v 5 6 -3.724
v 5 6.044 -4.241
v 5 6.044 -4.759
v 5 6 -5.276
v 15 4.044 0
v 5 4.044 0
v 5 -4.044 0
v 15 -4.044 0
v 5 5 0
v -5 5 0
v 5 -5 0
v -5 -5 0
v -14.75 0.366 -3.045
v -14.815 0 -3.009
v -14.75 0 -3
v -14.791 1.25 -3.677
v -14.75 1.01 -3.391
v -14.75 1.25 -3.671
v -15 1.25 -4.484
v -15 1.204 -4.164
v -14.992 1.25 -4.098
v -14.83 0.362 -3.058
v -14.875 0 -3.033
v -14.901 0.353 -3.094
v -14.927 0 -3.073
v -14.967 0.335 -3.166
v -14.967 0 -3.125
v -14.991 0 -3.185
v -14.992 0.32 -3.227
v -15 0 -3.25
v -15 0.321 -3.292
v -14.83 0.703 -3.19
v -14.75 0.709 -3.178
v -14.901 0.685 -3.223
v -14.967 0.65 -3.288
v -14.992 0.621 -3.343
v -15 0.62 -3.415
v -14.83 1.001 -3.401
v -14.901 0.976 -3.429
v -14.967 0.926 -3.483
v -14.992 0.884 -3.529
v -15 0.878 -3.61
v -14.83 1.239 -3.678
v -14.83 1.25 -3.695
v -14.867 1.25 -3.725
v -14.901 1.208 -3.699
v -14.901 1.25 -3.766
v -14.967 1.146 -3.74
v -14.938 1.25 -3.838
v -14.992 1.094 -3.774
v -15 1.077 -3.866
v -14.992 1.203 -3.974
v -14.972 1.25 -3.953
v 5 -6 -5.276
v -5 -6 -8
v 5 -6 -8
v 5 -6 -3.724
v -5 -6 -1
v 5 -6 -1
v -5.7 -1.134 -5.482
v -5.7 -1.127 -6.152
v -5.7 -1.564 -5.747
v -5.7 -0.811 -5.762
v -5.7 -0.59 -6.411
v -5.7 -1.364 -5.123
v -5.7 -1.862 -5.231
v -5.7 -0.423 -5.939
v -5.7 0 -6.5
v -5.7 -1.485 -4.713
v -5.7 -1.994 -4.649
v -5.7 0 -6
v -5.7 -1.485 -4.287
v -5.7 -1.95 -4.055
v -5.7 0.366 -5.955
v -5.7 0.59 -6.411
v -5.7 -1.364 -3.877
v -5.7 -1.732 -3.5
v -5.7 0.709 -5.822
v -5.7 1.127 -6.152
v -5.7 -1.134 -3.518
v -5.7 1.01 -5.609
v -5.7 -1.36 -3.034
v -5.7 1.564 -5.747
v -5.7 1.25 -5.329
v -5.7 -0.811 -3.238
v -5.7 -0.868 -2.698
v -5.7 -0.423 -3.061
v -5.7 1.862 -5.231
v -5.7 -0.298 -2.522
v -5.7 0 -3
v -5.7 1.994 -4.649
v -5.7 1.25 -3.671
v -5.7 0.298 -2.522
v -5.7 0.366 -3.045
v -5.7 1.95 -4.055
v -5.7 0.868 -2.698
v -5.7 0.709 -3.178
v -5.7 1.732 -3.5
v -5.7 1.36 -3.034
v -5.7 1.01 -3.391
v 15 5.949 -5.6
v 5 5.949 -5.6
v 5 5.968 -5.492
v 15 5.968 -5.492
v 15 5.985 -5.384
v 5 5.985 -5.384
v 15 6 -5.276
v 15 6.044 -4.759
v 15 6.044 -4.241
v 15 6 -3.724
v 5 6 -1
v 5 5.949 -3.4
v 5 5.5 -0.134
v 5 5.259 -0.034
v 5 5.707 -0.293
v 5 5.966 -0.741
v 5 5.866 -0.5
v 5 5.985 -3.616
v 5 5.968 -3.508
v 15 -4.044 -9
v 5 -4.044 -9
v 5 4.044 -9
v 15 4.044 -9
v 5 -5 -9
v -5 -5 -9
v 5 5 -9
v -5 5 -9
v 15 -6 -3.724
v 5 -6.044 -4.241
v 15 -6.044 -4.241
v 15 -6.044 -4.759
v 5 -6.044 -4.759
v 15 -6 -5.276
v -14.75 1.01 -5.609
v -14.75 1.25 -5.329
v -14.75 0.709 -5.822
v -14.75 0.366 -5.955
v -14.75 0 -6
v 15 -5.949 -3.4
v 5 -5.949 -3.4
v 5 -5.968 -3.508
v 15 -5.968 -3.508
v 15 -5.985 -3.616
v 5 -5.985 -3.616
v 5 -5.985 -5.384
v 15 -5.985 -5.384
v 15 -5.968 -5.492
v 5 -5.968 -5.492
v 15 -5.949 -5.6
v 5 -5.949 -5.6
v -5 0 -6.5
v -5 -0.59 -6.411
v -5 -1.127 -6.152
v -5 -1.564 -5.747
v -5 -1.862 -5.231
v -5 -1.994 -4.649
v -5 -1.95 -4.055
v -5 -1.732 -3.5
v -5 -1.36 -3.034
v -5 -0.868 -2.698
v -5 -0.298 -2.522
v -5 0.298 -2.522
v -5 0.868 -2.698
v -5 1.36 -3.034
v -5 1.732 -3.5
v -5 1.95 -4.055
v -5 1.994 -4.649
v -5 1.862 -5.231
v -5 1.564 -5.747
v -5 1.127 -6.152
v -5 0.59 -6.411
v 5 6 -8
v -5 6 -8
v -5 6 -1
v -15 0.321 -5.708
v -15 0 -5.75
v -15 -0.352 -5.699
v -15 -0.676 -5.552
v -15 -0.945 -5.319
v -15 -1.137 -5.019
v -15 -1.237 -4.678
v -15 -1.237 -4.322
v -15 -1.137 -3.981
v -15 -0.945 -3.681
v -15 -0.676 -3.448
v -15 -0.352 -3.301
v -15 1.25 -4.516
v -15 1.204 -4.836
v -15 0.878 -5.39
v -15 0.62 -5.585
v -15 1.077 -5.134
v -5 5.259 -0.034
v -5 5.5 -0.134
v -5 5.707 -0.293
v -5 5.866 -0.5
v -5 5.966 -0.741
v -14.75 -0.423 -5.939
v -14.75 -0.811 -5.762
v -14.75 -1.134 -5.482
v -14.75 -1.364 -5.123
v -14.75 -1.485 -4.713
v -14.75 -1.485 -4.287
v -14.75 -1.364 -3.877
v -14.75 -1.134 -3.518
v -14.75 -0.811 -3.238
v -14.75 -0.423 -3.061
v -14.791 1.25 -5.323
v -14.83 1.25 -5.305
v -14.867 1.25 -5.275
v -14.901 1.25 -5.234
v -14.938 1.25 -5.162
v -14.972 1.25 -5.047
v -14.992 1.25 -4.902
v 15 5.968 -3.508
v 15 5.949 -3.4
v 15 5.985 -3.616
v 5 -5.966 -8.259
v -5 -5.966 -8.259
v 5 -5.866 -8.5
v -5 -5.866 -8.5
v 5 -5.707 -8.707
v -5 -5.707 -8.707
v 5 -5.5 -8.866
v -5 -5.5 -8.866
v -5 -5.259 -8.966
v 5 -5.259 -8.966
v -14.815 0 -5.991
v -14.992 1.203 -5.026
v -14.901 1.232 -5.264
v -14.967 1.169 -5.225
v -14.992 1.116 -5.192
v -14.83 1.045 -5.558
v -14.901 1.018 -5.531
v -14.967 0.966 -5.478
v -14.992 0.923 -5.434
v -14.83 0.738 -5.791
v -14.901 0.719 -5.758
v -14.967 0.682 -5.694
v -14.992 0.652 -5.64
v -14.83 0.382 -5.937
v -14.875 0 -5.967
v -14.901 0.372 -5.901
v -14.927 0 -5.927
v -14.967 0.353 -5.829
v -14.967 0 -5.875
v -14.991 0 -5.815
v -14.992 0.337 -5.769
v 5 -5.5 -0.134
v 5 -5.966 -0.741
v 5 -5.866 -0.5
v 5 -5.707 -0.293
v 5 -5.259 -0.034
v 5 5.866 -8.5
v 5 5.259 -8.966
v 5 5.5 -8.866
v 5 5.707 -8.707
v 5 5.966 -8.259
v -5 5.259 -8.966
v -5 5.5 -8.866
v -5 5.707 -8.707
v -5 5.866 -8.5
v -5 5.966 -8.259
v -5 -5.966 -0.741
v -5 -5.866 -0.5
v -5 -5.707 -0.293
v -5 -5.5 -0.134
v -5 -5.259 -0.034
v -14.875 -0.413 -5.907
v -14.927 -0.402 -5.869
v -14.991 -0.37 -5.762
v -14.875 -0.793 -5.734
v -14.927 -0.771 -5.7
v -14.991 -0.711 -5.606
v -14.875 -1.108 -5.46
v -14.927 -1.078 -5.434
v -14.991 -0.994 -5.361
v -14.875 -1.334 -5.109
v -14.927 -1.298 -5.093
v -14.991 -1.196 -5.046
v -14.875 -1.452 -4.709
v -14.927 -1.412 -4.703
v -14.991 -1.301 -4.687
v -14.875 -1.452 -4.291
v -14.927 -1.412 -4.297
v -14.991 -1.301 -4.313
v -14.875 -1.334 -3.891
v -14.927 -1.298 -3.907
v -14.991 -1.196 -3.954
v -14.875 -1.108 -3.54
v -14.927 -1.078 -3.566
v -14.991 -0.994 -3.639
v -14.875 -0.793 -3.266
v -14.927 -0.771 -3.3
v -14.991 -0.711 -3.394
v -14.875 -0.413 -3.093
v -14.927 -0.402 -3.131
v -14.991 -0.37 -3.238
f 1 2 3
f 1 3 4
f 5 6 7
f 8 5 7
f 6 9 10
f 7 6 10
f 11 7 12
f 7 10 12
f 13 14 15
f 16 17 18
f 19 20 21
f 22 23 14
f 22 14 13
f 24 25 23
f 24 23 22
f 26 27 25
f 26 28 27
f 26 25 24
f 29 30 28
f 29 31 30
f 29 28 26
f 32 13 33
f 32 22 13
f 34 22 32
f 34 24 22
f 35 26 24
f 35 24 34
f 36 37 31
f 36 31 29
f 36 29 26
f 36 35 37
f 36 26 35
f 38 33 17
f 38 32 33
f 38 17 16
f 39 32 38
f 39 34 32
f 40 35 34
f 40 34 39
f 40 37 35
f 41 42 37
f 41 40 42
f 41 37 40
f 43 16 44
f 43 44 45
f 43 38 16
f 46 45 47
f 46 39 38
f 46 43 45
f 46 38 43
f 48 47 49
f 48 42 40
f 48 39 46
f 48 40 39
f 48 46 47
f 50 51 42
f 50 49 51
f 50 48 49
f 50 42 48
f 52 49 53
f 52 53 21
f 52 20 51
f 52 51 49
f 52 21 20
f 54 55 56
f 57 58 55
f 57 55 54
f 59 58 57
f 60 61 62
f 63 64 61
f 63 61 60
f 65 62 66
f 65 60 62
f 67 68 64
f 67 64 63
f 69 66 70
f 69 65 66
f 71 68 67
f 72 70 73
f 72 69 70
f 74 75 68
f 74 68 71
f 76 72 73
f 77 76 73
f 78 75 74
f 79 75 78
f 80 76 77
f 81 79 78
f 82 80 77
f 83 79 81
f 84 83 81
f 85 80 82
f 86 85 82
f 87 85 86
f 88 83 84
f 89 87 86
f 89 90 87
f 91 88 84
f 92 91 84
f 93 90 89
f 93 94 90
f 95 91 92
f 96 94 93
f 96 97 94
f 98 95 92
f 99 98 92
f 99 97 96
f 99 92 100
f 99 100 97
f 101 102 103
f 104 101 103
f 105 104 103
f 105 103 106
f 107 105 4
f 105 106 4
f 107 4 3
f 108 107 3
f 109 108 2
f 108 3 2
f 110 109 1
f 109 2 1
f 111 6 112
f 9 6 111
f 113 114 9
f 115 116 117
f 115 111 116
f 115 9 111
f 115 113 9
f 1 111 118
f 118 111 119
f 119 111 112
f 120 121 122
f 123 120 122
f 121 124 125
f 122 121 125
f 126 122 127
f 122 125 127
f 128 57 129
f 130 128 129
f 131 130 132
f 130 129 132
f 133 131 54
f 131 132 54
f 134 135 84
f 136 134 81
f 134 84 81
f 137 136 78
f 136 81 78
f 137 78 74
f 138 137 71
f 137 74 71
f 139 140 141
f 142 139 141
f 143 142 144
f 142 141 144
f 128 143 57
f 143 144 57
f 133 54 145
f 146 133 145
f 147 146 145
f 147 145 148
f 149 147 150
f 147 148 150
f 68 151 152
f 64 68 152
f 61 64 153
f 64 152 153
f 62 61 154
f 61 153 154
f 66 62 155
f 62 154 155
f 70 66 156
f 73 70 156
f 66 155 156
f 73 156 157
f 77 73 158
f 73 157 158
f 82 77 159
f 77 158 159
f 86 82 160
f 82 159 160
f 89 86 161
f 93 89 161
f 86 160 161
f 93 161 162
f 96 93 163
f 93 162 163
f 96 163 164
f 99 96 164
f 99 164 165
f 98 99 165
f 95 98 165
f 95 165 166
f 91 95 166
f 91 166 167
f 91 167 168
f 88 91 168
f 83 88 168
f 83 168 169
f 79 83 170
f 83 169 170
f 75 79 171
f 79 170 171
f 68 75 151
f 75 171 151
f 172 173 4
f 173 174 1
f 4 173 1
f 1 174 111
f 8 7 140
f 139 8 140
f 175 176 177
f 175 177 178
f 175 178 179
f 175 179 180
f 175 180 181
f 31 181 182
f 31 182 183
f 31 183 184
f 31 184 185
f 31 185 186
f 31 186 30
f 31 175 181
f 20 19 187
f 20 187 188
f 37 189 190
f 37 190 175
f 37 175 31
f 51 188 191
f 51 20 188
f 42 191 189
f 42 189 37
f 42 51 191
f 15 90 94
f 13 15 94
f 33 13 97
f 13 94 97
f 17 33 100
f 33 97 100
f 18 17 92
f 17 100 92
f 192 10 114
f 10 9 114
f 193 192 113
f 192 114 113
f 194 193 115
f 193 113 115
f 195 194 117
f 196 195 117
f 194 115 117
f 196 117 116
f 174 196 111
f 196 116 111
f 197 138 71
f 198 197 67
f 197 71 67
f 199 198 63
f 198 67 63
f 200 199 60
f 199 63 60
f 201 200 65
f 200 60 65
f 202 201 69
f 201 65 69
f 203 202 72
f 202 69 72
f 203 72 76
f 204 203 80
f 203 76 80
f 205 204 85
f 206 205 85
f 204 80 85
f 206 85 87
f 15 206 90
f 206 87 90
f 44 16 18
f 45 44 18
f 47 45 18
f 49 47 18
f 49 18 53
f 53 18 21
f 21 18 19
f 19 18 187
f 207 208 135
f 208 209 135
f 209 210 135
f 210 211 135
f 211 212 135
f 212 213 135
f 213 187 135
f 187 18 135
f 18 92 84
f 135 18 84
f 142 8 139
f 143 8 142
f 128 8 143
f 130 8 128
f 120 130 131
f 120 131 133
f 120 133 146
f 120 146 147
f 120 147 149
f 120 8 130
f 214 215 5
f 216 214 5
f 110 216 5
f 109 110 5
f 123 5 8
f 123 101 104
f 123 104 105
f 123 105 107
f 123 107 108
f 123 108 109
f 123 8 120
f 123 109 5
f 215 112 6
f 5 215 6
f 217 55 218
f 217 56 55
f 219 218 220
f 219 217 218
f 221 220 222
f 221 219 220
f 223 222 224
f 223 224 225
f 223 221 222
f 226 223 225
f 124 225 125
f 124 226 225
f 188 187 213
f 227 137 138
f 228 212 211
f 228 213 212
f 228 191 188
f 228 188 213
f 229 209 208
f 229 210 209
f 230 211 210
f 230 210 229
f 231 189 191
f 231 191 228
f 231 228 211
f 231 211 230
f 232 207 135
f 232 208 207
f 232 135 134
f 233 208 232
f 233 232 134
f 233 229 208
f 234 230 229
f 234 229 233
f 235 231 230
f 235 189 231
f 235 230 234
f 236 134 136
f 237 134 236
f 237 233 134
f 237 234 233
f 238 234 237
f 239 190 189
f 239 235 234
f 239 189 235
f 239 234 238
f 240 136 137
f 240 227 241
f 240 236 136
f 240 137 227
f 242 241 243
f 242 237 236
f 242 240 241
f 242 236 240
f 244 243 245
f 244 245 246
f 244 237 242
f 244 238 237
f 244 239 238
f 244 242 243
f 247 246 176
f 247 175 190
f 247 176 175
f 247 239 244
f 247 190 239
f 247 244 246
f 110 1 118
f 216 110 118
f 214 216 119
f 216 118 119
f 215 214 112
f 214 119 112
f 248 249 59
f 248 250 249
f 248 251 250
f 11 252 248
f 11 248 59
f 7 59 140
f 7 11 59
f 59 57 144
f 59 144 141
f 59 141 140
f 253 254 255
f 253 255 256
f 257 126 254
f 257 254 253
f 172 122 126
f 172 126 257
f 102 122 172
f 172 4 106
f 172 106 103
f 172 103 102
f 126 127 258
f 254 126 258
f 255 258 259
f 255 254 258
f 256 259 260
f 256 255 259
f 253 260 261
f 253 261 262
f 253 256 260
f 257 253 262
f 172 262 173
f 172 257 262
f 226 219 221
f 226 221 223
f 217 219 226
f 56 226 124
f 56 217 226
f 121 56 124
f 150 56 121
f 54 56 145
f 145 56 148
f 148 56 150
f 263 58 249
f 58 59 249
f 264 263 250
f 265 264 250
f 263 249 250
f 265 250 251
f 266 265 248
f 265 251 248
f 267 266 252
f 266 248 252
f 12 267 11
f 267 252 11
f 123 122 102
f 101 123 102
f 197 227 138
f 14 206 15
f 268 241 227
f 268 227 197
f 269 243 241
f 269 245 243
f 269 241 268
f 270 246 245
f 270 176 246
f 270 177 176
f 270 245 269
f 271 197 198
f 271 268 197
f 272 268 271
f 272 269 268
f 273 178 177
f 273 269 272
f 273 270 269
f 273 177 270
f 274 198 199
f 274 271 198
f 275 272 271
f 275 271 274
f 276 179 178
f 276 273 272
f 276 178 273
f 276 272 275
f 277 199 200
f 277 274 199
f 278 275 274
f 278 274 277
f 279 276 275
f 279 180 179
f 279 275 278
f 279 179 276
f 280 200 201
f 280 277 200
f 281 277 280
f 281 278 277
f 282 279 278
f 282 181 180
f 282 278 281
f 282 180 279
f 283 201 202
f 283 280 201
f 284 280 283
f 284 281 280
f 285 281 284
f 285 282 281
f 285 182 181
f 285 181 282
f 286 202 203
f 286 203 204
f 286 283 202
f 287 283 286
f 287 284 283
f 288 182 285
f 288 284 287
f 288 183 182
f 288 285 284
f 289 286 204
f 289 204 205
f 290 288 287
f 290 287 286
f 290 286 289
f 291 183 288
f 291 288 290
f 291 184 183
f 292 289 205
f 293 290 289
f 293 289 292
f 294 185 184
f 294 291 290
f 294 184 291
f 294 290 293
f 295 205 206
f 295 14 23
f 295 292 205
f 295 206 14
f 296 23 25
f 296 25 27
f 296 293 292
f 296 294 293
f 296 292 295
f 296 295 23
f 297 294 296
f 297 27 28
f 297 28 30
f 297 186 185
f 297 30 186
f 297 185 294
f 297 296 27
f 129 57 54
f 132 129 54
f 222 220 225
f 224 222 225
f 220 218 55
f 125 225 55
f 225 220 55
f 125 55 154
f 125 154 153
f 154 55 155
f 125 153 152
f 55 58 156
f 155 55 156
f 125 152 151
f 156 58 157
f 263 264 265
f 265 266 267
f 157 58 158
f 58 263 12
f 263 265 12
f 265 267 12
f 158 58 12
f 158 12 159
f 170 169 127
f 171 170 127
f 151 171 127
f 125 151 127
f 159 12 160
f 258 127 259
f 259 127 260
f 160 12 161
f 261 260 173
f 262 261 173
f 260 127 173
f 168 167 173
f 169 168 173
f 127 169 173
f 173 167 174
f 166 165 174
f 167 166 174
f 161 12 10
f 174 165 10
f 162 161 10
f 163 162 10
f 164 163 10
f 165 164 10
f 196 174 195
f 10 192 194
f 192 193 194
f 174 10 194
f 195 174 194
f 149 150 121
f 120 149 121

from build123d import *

# Parameters (mm, degrees)
SKETCH1_W           = 10
SKETCH1_H           = 12
SKETCH1_R           = 0.7
BOSS_EXTRUDE1_DEPTH = 9
BOSS_EXTRUDE2_DEPTH = 10
BOSS_EXTRUDE4_DEPTH = 0.7
BOSS_EXTRUDE5_DEPTH = 10
FILLET1_R           = 1
FILLET2_R           = 0.25


with BuildPart() as part:
    # Sketch1 → Boss-Extrude1 (new body)
    # profile 1 of 3: a face of its own
    with BuildSketch(Plane.XY):
        Rectangle(SKETCH1_W, SKETCH1_H)
        with Locations((0, 4.5)):
            Circle(SKETCH1_R, mode=Mode.SUBTRACT)
        with Locations((0, -4.5)):
            Circle(SKETCH1_R, mode=Mode.SUBTRACT)
    # profile 2 of 3: a face of its own
    with BuildSketch(Plane.XY):
        with Locations((0, -4.5)):
            Circle(SKETCH1_R)
    # profile 3 of 3: a face of its own
    with BuildSketch(Plane.XY):
        with Locations((0, 4.5)):
            Circle(SKETCH1_R)
    extrude(amount=-BOSS_EXTRUDE1_DEPTH)

    # Sketch2 → Boss-Extrude2 (add)
    with BuildSketch(Plane(origin=(5, 0, 0), x_dir=(0, 0, -1), z_dir=(1, 0, 0))):
        with BuildLine():
            Line((3.4, 5.949159605), (0, 4.043822449))
            Line((0, 4.043822449), (0, -4.043822449))
            Line((0, -4.043822449), (3.4, -5.949159605))
            ThreePointArc((3.4, -5.949159605), (3.561551285, -5.976772876), (3.723791265, -6))
            Line((3.723791265, -6), (5.276208735, -6))
            ThreePointArc((5.276208735, -6), (5.438448715, -5.976772876), (5.6, -5.949159605))
            Line((5.6, -5.949159605), (9, -4.043822449))
            Line((9, -4.043822449), (9, 4.043822449))
            Line((9, 4.043822449), (5.6, 5.949159605))
            ThreePointArc((5.6, 5.949159605), (5.438448715, 5.976772876), (5.276208735, 6))
            Line((5.276208735, 6), (3.723791265, 6))
            ThreePointArc((3.723791265, 6), (3.561551285, 5.976772876), (3.4, 5.949159605))
        make_face()
        with BuildLine():
            ThreePointArc((5.276208735, 6), (4.5, 6.05), (3.723791265, 6))
            Line((3.723791265, 6), (5.276208735, 6))
        make_face()
        with BuildLine():
            Line((5.276208735, -6), (3.723791265, -6))
            ThreePointArc((3.723791265, -6), (4.5, -6.05), (5.276208735, -6))
        make_face()
    extrude(amount=BOSS_EXTRUDE2_DEPTH)

    # Sketch4 → Boss-Extrude4 (add)
    with BuildSketch(Plane.ZY.offset(5)):
        with BuildLine():
            ThreePointArc((-6.5, 0), (-4.5, -2), (-2.5, 0))
            Line((-2.5, 0), (-3, 0))
            ThreePointArc((-3, 0), (-4.5, -1.5), (-6, 0))
            Line((-6, 0), (-6.5, 0))
        make_face()
        with BuildLine():
            Line((-3, 0), (-2.5, 0))
            ThreePointArc((-2.5, 0), (-4.5, 2), (-6.5, 0))
            Line((-6.5, 0), (-6, 0))
            ThreePointArc((-6, 0), (-5.821691018, 0.709318583), (-5.329156198, 1.25))
            ThreePointArc((-5.329156198, 1.25), (-4.5, 1.5), (-3.670843802, 1.25))
            ThreePointArc((-3.670843802, 1.25), (-3.178308982, 0.709318583), (-3, 0))
        make_face()
        with BuildLine():
            ThreePointArc((-6.5, 0), (-4.5, -2), (-2.5, 0))
            Line((-2.5, 0), (-3, 0))
            ThreePointArc((-3, 0), (-4.5, -1.5), (-6, 0))
            Line((-6, 0), (-6.5, 0))
        make_face()
        with BuildLine():
            Line((-3, 0), (-2.5, 0))
            ThreePointArc((-2.5, 0), (-4.5, 2), (-6.5, 0))
            Line((-6.5, 0), (-6, 0))
            ThreePointArc((-6, 0), (-5.821691018, 0.709318583), (-5.329156198, 1.25))
            ThreePointArc((-5.329156198, 1.25), (-4.5, 1.5), (-3.670843802, 1.25))
            ThreePointArc((-3.670843802, 1.25), (-3.178308982, 0.709318583), (-3, 0))
        make_face()
        with BuildLine():
            Line((-6, 0), (-3, 0))
            ThreePointArc((-3, 0), (-3.178308982, 0.709318583), (-3.670843802, 1.25))
            Line((-3.670843802, 1.25), (-5.329156198, 1.25))
            ThreePointArc((-5.329156198, 1.25), (-5.821691018, 0.709318583), (-6, 0))
        make_face()
        with BuildLine():
            Line((-5.329156198, 1.25), (-3.670843802, 1.25))
            ThreePointArc((-3.670843802, 1.25), (-4.5, 1.5), (-5.329156198, 1.25))
        make_face()
        with BuildLine():
            ThreePointArc((-6, 0), (-4.5, -1.5), (-3, 0))
            Line((-3, 0), (-6, 0))
        make_face()
    extrude(amount=BOSS_EXTRUDE4_DEPTH)

    # Sketch4<3> → Boss-Extrude5 (add)
    with BuildSketch(Plane.ZY.offset(5)):
        with BuildLine():
            Line((-6, 0), (-3, 0))
            ThreePointArc((-3, 0), (-3.178308982, 0.709318583), (-3.670843802, 1.25))
            Line((-3.670843802, 1.25), (-5.329156198, 1.25))
            ThreePointArc((-5.329156198, 1.25), (-5.821691018, 0.709318583), (-6, 0))
        make_face()
        with BuildLine():
            ThreePointArc((-6, 0), (-4.5, -1.5), (-3, 0))
            Line((-3, 0), (-6, 0))
        make_face()
    extrude(amount=BOSS_EXTRUDE5_DEPTH)

    # Fillet1
    fillet1_edges = [part.edges().sort_by_distance(p)[0] for p in [
        (0, 6, -9),
        (0, -6, -9),
        (0, 6, 0),
        (0, -6, 0),
    ]]
    fillet(fillet1_edges, radius=FILLET1_R)

    # Fillet2
    fillet2_edges = [part.edges().sort_by_distance(p)[0] for p in [
        (-15, -1.321691018, -5.209318583),
    ]]
    fillet(fillet2_edges, radius=FILLET2_R - 0.0001)  # a hair under: the kernel refuses the full size


solid = part.part
